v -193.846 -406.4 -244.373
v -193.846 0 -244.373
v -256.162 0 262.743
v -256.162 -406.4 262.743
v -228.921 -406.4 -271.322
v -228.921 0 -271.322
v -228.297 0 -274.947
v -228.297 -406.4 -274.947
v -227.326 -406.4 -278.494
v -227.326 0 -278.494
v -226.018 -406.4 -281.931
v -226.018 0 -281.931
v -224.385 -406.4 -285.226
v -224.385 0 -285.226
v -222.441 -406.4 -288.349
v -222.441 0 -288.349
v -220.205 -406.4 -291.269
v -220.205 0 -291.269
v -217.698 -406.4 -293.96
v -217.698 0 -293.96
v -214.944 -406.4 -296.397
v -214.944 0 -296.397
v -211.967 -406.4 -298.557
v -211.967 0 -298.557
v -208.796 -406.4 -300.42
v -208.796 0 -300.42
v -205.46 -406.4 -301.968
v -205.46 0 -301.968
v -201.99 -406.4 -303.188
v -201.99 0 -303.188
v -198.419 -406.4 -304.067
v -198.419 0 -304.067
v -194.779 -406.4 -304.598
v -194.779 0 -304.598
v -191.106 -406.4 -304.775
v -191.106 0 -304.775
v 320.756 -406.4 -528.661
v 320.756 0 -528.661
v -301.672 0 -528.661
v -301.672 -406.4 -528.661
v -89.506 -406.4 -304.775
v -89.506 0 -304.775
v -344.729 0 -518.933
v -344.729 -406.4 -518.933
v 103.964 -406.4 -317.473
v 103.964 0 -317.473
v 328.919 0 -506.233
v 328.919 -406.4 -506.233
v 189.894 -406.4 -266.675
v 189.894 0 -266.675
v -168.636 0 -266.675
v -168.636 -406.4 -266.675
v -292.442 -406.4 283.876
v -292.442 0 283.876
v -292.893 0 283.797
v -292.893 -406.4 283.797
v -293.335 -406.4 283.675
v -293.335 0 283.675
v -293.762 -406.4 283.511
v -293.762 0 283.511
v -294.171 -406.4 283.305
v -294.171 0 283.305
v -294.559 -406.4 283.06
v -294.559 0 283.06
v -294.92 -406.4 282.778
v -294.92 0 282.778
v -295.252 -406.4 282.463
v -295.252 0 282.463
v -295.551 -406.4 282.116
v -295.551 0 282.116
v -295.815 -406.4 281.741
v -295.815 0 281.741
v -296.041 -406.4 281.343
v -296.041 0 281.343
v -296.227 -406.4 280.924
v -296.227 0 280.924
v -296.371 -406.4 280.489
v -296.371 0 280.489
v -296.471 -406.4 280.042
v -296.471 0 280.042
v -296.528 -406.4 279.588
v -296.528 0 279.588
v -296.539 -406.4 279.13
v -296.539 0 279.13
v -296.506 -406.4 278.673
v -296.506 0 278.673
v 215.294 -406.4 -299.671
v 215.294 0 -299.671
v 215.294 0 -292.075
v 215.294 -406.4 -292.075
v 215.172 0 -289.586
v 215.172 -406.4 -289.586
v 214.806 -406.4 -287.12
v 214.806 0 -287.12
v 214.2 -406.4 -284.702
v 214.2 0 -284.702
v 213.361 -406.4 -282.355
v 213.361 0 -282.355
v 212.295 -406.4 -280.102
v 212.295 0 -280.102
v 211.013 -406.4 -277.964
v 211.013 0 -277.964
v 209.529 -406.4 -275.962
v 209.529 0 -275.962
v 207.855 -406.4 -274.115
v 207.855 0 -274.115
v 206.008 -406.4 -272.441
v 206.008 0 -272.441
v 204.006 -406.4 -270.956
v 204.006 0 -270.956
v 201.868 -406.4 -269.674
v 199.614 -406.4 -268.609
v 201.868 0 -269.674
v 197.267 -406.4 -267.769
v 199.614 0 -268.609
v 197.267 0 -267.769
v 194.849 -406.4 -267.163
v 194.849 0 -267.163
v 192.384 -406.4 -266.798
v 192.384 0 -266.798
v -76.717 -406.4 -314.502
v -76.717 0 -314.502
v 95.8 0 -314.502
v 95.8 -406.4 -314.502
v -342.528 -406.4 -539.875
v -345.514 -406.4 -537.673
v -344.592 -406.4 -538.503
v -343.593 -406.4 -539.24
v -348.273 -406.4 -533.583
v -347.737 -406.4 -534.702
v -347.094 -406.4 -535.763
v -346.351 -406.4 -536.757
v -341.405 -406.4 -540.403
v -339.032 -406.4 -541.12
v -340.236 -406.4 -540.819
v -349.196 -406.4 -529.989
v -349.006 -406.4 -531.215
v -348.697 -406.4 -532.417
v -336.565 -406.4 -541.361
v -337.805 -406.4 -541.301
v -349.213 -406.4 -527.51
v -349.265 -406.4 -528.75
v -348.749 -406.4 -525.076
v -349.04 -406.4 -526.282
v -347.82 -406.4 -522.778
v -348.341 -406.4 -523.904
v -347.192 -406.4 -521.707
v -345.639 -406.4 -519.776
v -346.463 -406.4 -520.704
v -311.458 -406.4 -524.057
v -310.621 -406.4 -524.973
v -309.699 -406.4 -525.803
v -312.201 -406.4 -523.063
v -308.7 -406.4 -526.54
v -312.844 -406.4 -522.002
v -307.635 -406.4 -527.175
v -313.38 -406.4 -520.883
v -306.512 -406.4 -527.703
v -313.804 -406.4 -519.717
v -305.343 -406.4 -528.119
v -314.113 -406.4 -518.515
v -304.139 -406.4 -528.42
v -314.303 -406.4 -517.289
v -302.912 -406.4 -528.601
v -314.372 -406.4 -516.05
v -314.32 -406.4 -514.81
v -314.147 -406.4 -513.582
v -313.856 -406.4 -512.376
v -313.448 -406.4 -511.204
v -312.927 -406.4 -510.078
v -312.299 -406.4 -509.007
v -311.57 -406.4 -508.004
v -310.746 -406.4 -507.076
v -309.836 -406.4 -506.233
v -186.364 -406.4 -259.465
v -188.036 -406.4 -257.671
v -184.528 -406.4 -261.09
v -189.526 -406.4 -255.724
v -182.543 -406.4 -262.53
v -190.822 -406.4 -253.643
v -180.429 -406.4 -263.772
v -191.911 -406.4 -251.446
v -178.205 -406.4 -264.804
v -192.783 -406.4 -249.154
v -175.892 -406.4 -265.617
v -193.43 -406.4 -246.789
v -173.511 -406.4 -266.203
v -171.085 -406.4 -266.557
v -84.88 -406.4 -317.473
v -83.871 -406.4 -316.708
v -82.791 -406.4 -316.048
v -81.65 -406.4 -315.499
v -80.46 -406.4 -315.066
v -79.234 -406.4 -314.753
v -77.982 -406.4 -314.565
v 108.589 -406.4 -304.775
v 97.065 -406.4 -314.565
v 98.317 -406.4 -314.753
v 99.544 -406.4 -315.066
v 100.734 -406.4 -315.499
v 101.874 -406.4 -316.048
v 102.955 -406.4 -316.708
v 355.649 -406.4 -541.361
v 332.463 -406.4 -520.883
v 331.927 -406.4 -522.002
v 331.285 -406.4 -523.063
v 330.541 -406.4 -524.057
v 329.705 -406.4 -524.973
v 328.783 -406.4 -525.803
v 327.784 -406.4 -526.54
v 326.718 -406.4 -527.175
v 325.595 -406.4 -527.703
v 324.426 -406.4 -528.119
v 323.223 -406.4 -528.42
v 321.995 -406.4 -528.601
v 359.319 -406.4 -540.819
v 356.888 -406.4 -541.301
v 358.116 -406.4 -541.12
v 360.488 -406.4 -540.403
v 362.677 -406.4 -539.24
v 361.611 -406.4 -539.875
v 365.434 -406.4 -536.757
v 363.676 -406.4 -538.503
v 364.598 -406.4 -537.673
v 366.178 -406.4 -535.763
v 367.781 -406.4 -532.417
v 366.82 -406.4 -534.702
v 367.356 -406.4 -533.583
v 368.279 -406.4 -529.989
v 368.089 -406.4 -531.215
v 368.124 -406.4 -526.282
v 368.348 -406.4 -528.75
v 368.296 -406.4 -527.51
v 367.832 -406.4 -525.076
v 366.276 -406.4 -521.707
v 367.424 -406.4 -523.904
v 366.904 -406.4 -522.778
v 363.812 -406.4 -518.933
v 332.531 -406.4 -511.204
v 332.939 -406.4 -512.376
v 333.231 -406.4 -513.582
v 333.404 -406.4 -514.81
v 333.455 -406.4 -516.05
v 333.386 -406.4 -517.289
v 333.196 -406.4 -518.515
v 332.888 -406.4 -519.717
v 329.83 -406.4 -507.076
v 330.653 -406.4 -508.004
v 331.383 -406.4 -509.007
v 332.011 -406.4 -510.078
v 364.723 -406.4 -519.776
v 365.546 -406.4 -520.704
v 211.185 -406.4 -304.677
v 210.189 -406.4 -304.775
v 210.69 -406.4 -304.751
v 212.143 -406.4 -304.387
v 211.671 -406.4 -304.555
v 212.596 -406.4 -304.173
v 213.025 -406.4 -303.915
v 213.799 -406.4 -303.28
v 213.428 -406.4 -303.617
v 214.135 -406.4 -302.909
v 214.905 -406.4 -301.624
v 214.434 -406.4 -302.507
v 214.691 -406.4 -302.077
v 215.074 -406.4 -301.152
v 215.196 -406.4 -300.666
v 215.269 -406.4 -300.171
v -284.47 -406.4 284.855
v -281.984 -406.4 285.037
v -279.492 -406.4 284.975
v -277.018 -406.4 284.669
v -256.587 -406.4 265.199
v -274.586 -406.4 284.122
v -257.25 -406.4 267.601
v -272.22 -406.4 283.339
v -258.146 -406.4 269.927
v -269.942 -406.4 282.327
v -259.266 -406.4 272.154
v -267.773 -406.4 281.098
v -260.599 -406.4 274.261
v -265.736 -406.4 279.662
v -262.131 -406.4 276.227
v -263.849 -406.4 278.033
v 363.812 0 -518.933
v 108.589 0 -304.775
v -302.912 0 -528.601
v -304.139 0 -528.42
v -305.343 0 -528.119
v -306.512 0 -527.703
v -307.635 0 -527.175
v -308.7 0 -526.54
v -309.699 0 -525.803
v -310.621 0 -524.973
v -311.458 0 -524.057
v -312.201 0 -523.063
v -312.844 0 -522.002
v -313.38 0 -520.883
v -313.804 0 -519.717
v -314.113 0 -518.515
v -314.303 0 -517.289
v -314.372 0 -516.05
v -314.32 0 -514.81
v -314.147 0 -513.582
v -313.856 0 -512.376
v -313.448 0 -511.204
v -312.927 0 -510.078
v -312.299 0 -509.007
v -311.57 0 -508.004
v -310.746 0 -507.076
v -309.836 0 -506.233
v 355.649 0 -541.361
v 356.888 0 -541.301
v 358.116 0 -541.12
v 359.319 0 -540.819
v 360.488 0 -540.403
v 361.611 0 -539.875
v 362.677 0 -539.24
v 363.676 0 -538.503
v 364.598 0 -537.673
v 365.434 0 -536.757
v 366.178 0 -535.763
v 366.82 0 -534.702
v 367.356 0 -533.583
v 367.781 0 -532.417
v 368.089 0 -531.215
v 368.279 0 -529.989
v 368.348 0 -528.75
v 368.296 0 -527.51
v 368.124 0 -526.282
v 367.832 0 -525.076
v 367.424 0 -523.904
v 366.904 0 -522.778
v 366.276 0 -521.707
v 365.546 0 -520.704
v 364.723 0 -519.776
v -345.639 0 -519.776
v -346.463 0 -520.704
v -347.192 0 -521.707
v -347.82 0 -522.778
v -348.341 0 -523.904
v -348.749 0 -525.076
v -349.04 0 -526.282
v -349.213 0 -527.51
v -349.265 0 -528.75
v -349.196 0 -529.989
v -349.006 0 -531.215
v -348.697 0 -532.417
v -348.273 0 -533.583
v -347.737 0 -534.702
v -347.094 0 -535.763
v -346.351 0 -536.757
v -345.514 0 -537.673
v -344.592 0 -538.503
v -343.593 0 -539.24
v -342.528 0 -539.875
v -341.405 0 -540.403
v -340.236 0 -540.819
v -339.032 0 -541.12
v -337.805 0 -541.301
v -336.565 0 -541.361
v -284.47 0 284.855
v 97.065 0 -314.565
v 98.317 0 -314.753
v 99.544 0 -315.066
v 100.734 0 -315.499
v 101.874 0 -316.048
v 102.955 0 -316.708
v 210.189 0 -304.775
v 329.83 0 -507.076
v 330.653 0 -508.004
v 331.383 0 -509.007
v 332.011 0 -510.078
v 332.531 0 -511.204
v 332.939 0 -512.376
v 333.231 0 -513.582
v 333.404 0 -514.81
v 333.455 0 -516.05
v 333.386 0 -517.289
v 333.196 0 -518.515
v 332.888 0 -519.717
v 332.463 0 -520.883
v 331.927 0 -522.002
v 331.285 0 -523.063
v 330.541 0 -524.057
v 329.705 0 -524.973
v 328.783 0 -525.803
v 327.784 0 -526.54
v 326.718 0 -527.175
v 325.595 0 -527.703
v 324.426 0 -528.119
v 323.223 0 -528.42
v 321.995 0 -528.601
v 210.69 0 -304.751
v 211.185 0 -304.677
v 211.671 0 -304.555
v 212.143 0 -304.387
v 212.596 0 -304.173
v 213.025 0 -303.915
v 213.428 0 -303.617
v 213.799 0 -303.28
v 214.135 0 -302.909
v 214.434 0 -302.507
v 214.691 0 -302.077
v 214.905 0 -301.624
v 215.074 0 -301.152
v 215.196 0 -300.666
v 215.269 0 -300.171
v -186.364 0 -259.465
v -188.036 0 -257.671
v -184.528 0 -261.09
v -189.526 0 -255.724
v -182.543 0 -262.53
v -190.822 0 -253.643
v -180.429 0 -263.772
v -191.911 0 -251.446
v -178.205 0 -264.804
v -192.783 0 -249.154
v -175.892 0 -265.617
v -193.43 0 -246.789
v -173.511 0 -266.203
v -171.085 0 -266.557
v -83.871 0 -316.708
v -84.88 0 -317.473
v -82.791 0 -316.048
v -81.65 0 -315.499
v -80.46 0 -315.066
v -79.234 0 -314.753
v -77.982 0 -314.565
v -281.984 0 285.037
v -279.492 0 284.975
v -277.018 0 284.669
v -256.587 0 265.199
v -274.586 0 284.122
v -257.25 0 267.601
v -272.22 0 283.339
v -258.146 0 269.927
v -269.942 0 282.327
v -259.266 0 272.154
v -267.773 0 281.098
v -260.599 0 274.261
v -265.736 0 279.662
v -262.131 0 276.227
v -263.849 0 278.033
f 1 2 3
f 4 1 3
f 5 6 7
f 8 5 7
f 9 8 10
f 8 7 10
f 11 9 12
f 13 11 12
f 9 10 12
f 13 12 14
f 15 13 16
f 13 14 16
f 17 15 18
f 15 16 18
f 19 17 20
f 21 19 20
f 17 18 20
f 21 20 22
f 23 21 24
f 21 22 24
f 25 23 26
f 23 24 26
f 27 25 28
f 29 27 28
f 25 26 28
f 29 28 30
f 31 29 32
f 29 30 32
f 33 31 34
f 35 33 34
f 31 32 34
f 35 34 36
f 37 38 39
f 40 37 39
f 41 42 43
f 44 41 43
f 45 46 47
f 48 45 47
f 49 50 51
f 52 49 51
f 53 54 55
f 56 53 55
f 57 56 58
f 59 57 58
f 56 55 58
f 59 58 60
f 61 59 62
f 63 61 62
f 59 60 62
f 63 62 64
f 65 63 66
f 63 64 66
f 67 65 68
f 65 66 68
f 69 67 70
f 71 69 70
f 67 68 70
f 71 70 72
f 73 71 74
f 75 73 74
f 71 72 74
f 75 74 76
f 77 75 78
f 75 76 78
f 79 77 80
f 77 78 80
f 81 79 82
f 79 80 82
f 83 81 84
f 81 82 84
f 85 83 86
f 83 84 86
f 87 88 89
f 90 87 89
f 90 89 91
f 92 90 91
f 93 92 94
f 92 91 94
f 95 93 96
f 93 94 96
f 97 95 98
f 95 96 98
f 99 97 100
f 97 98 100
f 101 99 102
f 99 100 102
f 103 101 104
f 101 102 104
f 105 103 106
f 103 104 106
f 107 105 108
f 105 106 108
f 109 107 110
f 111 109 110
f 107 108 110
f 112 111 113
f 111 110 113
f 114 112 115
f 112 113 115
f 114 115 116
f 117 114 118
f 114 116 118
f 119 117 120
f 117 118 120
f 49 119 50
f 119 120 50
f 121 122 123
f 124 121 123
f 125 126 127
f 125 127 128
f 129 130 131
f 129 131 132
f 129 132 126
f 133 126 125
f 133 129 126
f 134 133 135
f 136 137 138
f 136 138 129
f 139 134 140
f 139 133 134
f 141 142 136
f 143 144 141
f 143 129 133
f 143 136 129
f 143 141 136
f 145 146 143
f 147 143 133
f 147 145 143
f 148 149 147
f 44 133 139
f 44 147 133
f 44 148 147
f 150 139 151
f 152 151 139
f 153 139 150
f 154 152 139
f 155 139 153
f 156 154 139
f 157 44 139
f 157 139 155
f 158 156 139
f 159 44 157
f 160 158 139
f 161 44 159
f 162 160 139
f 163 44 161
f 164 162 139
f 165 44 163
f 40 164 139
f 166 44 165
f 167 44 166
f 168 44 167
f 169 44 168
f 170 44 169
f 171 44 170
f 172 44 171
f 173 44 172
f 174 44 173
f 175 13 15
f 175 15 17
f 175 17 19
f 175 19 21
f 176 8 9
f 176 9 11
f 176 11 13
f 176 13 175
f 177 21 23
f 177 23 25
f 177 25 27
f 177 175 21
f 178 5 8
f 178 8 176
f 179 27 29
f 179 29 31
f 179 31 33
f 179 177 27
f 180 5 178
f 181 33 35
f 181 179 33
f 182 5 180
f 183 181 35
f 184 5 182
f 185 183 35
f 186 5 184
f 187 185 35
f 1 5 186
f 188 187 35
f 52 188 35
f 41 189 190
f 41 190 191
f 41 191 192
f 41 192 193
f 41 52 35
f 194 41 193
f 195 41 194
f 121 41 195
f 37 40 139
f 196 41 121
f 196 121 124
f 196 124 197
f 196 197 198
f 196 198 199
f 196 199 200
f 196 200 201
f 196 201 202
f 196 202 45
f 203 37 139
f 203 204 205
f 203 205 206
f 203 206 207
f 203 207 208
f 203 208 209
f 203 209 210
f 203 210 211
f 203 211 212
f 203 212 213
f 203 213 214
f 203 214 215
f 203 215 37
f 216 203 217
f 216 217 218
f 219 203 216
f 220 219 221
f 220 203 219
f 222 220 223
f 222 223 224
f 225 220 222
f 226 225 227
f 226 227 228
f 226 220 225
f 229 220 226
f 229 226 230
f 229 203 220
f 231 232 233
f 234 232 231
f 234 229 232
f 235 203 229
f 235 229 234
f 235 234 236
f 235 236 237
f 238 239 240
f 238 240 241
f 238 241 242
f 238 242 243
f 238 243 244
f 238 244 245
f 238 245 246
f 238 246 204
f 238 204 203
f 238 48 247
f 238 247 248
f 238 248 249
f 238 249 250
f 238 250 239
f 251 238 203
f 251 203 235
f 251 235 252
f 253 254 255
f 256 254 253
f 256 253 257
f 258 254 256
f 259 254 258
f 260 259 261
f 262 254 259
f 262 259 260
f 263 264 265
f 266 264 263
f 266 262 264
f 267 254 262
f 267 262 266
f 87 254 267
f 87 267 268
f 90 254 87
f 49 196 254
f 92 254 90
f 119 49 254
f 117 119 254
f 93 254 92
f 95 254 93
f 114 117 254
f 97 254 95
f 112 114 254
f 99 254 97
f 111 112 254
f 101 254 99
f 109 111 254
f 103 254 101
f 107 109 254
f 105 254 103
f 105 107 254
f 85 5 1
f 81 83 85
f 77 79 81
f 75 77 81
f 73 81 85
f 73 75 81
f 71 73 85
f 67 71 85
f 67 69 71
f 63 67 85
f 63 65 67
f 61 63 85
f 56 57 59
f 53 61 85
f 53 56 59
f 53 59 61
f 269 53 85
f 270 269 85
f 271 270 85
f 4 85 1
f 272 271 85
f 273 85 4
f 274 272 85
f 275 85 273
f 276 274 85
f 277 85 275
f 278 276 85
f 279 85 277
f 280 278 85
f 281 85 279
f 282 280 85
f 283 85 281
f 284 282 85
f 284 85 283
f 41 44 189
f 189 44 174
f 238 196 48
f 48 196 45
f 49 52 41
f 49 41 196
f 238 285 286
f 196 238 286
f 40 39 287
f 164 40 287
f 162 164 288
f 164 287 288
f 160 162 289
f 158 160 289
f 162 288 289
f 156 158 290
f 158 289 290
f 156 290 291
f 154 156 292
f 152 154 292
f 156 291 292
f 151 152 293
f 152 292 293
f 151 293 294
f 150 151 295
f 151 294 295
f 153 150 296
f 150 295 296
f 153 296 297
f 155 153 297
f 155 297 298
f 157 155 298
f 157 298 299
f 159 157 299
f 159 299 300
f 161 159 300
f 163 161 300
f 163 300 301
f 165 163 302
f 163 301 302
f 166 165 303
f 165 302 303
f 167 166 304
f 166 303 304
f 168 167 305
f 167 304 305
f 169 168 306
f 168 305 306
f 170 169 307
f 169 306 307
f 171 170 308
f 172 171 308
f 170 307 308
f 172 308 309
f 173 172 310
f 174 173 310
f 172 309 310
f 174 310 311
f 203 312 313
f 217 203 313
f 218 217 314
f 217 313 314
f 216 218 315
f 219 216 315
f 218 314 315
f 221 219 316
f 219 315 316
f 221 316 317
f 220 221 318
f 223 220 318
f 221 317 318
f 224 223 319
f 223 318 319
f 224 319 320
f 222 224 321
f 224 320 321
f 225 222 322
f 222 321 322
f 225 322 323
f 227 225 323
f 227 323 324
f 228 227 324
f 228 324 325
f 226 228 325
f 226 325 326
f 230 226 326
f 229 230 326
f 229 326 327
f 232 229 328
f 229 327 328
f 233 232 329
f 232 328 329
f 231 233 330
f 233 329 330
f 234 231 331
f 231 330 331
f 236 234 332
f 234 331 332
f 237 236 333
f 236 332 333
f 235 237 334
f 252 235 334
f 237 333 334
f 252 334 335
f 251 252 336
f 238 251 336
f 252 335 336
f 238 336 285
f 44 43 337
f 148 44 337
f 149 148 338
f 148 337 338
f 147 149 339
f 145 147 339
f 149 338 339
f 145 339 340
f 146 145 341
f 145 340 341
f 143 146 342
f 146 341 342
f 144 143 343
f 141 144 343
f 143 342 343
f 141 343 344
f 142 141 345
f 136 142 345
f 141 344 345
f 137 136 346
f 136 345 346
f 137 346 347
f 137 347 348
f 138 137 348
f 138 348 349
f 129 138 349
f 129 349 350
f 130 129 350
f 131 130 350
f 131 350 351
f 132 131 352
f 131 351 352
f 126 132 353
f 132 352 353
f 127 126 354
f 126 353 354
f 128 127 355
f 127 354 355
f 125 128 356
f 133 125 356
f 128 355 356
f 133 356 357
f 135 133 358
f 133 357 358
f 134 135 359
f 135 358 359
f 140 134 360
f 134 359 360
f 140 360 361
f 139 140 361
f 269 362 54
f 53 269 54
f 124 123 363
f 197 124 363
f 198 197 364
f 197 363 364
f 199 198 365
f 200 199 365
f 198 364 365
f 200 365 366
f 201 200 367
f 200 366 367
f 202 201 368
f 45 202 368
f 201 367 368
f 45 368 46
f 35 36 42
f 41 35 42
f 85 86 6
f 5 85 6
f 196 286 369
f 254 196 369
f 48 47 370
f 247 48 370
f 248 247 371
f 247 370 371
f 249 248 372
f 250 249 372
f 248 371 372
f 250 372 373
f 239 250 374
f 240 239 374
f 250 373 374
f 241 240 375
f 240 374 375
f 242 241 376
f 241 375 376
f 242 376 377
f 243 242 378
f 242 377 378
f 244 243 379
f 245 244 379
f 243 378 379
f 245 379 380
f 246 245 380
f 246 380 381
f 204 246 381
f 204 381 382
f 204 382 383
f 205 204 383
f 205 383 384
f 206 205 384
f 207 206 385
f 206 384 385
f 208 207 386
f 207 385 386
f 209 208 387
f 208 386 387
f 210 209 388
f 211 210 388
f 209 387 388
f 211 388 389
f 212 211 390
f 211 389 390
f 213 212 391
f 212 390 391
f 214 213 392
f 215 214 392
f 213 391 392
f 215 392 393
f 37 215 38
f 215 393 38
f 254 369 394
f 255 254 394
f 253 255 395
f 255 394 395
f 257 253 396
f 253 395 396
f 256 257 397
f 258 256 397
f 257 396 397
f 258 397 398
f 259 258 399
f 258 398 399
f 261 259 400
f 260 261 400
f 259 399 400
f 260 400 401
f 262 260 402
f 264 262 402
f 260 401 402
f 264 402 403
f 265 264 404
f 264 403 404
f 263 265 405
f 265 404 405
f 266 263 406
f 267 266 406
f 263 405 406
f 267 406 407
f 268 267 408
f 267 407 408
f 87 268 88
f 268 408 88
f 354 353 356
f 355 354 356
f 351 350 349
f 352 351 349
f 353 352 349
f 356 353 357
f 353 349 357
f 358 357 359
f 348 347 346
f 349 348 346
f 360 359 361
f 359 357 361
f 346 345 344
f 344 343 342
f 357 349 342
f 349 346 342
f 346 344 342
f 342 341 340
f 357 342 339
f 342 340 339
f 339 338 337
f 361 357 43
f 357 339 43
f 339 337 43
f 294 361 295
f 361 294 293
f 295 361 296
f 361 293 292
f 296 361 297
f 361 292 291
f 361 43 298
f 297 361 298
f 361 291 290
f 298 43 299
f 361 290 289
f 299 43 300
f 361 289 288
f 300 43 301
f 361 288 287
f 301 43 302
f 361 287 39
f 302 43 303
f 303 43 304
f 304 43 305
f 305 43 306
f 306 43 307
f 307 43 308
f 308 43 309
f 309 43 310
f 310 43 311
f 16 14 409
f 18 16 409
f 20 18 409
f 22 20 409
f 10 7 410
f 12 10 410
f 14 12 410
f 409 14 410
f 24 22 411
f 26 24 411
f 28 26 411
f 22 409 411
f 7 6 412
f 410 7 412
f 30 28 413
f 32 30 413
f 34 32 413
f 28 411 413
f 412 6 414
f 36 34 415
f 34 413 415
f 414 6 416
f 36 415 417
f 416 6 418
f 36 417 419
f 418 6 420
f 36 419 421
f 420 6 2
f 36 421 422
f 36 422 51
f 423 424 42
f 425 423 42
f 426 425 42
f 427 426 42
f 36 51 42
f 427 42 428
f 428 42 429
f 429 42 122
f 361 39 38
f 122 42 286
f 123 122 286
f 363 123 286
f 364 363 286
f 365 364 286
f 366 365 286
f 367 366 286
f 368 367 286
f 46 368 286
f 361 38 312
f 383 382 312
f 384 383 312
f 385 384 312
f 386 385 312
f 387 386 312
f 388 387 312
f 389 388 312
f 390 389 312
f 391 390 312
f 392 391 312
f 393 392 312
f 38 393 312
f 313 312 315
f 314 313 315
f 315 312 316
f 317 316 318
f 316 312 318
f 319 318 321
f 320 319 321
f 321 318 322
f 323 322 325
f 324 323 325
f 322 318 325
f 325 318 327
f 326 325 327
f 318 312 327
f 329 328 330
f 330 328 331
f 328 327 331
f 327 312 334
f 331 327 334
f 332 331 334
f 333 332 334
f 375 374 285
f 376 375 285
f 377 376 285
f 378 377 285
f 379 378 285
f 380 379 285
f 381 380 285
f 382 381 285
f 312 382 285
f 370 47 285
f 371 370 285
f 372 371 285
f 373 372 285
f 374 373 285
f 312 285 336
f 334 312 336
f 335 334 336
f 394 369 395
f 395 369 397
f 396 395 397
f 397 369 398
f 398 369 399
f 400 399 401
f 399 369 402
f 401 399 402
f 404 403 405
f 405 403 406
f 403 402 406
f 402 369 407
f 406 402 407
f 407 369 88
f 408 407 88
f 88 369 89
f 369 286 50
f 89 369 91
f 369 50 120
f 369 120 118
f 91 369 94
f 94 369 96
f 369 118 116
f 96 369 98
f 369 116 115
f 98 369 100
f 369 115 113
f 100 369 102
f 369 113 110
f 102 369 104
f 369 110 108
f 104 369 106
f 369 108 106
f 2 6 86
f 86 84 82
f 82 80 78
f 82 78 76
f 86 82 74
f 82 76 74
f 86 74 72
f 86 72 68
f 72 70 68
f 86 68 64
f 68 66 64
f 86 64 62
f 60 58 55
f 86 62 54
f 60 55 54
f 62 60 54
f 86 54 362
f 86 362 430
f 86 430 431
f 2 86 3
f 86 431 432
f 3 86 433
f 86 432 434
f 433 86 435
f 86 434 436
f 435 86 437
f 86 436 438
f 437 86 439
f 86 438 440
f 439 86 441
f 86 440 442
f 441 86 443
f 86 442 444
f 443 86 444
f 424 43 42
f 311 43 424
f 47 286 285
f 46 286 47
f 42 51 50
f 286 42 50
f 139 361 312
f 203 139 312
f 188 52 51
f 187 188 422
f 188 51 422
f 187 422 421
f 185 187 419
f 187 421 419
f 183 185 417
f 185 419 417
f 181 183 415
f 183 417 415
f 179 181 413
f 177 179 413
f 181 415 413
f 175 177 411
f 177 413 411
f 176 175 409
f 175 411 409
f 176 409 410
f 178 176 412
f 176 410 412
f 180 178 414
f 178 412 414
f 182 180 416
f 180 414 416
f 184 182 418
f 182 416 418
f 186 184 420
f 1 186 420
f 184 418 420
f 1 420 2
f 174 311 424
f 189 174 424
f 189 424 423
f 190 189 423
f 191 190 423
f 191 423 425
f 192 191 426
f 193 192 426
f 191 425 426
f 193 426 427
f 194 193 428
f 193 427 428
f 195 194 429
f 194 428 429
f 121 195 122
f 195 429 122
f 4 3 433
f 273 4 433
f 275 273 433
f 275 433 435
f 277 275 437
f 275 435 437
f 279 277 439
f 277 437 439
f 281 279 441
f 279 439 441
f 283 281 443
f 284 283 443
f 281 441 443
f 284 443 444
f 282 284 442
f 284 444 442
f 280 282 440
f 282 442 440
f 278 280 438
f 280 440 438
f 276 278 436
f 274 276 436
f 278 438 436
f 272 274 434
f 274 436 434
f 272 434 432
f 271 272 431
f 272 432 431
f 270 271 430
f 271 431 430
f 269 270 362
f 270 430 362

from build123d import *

# Parameters (mm, degrees)
F1_DEPTH = 406.4


with BuildPart() as f1:
    # F0 (on Front) → F1 (new body)
    with BuildSketch(Plane.XZ):
        with BuildLine():
            Line((-191.105931, -266.675295), (-228.921497, -271.322122))
            ThreePointArc((-228.921497, -271.322122), (-216.350395, -295.211711), (-191.105931, -304.775295))
            Line((-191.105931, -304.775295), (-191.105931, -266.675295))
        make_face()
        with BuildLine():
            Line((-193.846445, -244.37318), (-256.161501, 262.742624))
            ThreePointArc((-256.161501, 262.742624), (-265.735985, 279.661703), (-284.469762, 284.855116))
            Line((-284.469762, 284.855116), (-292.441746, 283.875508))
            ThreePointArc((-292.441746, 283.875508), (-295.551163, 282.115894), (-296.505617, 278.672969))
            Line((-296.505617, 278.672969), (-228.921497, -271.322122))
            Line((-228.921497, -271.322122), (-191.105931, -266.675295))
            Line((-191.105931, -266.675295), (-191.105931, -304.775295))
            Line((-191.105931, -304.775295), (-89.505931, -304.775295))
            Line((-89.505931, -304.775295), (108.589325, -304.775295))
            Line((108.589325, -304.775295), (210.189325, -304.775295))
            ThreePointArc((210.189325, -304.775295), (213.798924, -303.280151), (215.294069, -299.670552))
            Line((215.294069, -299.670552), (215.294069, -292.075295))
            ThreePointArc((215.294069, -292.075295), (207.854581, -274.114783), (189.894069, -266.675295))
            Line((189.894069, -266.675295), (-168.636068, -266.675295))
            ThreePointArc((-168.636068, -266.675295), (-185.46571, -260.299573), (-193.846445, -244.37318))
        make_face()
        with BuildLine():
            Line((108.589325, -304.775295), (-89.505931, -304.775295))
            Line((-89.505931, -304.775295), (-344.728743, -518.932662))
            ThreePointArc((-344.728743, -518.932662), (-348.499436, -533.005082), (-336.56534, -541.361427))
            Line((-336.56534, -541.361427), (355.648734, -541.361427))
            ThreePointArc((355.648734, -541.361427), (367.58283, -533.005082), (363.812136, -518.932662))
            Line((363.812136, -518.932662), (108.589325, -304.775295))
        make_face()
        with BuildLine():
            Line((-309.835779, -506.232662), (-84.880484, -317.472757))
            ThreePointArc((-84.880484, -317.472757), (-81.060737, -315.267425), (-76.717081, -314.501521))
            Line((-76.717081, -314.501521), (95.800475, -314.501521))
            ThreePointArc((95.800475, -314.501521), (100.144131, -315.267425), (103.963877, -317.472757))
            Line((103.963877, -317.472757), (328.919173, -506.232662))
            ThreePointArc((328.919173, -506.232662), (332.689867, -520.305082), (320.75577, -528.661427))
            Line((320.75577, -528.661427), (-301.672377, -528.661427))
            ThreePointArc((-301.672377, -528.661427), (-313.606473, -520.305082), (-309.835779, -506.232662))
        make_face(mode=Mode.SUBTRACT)
    extrude(amount=F1_DEPTH)


solid = f1.part
